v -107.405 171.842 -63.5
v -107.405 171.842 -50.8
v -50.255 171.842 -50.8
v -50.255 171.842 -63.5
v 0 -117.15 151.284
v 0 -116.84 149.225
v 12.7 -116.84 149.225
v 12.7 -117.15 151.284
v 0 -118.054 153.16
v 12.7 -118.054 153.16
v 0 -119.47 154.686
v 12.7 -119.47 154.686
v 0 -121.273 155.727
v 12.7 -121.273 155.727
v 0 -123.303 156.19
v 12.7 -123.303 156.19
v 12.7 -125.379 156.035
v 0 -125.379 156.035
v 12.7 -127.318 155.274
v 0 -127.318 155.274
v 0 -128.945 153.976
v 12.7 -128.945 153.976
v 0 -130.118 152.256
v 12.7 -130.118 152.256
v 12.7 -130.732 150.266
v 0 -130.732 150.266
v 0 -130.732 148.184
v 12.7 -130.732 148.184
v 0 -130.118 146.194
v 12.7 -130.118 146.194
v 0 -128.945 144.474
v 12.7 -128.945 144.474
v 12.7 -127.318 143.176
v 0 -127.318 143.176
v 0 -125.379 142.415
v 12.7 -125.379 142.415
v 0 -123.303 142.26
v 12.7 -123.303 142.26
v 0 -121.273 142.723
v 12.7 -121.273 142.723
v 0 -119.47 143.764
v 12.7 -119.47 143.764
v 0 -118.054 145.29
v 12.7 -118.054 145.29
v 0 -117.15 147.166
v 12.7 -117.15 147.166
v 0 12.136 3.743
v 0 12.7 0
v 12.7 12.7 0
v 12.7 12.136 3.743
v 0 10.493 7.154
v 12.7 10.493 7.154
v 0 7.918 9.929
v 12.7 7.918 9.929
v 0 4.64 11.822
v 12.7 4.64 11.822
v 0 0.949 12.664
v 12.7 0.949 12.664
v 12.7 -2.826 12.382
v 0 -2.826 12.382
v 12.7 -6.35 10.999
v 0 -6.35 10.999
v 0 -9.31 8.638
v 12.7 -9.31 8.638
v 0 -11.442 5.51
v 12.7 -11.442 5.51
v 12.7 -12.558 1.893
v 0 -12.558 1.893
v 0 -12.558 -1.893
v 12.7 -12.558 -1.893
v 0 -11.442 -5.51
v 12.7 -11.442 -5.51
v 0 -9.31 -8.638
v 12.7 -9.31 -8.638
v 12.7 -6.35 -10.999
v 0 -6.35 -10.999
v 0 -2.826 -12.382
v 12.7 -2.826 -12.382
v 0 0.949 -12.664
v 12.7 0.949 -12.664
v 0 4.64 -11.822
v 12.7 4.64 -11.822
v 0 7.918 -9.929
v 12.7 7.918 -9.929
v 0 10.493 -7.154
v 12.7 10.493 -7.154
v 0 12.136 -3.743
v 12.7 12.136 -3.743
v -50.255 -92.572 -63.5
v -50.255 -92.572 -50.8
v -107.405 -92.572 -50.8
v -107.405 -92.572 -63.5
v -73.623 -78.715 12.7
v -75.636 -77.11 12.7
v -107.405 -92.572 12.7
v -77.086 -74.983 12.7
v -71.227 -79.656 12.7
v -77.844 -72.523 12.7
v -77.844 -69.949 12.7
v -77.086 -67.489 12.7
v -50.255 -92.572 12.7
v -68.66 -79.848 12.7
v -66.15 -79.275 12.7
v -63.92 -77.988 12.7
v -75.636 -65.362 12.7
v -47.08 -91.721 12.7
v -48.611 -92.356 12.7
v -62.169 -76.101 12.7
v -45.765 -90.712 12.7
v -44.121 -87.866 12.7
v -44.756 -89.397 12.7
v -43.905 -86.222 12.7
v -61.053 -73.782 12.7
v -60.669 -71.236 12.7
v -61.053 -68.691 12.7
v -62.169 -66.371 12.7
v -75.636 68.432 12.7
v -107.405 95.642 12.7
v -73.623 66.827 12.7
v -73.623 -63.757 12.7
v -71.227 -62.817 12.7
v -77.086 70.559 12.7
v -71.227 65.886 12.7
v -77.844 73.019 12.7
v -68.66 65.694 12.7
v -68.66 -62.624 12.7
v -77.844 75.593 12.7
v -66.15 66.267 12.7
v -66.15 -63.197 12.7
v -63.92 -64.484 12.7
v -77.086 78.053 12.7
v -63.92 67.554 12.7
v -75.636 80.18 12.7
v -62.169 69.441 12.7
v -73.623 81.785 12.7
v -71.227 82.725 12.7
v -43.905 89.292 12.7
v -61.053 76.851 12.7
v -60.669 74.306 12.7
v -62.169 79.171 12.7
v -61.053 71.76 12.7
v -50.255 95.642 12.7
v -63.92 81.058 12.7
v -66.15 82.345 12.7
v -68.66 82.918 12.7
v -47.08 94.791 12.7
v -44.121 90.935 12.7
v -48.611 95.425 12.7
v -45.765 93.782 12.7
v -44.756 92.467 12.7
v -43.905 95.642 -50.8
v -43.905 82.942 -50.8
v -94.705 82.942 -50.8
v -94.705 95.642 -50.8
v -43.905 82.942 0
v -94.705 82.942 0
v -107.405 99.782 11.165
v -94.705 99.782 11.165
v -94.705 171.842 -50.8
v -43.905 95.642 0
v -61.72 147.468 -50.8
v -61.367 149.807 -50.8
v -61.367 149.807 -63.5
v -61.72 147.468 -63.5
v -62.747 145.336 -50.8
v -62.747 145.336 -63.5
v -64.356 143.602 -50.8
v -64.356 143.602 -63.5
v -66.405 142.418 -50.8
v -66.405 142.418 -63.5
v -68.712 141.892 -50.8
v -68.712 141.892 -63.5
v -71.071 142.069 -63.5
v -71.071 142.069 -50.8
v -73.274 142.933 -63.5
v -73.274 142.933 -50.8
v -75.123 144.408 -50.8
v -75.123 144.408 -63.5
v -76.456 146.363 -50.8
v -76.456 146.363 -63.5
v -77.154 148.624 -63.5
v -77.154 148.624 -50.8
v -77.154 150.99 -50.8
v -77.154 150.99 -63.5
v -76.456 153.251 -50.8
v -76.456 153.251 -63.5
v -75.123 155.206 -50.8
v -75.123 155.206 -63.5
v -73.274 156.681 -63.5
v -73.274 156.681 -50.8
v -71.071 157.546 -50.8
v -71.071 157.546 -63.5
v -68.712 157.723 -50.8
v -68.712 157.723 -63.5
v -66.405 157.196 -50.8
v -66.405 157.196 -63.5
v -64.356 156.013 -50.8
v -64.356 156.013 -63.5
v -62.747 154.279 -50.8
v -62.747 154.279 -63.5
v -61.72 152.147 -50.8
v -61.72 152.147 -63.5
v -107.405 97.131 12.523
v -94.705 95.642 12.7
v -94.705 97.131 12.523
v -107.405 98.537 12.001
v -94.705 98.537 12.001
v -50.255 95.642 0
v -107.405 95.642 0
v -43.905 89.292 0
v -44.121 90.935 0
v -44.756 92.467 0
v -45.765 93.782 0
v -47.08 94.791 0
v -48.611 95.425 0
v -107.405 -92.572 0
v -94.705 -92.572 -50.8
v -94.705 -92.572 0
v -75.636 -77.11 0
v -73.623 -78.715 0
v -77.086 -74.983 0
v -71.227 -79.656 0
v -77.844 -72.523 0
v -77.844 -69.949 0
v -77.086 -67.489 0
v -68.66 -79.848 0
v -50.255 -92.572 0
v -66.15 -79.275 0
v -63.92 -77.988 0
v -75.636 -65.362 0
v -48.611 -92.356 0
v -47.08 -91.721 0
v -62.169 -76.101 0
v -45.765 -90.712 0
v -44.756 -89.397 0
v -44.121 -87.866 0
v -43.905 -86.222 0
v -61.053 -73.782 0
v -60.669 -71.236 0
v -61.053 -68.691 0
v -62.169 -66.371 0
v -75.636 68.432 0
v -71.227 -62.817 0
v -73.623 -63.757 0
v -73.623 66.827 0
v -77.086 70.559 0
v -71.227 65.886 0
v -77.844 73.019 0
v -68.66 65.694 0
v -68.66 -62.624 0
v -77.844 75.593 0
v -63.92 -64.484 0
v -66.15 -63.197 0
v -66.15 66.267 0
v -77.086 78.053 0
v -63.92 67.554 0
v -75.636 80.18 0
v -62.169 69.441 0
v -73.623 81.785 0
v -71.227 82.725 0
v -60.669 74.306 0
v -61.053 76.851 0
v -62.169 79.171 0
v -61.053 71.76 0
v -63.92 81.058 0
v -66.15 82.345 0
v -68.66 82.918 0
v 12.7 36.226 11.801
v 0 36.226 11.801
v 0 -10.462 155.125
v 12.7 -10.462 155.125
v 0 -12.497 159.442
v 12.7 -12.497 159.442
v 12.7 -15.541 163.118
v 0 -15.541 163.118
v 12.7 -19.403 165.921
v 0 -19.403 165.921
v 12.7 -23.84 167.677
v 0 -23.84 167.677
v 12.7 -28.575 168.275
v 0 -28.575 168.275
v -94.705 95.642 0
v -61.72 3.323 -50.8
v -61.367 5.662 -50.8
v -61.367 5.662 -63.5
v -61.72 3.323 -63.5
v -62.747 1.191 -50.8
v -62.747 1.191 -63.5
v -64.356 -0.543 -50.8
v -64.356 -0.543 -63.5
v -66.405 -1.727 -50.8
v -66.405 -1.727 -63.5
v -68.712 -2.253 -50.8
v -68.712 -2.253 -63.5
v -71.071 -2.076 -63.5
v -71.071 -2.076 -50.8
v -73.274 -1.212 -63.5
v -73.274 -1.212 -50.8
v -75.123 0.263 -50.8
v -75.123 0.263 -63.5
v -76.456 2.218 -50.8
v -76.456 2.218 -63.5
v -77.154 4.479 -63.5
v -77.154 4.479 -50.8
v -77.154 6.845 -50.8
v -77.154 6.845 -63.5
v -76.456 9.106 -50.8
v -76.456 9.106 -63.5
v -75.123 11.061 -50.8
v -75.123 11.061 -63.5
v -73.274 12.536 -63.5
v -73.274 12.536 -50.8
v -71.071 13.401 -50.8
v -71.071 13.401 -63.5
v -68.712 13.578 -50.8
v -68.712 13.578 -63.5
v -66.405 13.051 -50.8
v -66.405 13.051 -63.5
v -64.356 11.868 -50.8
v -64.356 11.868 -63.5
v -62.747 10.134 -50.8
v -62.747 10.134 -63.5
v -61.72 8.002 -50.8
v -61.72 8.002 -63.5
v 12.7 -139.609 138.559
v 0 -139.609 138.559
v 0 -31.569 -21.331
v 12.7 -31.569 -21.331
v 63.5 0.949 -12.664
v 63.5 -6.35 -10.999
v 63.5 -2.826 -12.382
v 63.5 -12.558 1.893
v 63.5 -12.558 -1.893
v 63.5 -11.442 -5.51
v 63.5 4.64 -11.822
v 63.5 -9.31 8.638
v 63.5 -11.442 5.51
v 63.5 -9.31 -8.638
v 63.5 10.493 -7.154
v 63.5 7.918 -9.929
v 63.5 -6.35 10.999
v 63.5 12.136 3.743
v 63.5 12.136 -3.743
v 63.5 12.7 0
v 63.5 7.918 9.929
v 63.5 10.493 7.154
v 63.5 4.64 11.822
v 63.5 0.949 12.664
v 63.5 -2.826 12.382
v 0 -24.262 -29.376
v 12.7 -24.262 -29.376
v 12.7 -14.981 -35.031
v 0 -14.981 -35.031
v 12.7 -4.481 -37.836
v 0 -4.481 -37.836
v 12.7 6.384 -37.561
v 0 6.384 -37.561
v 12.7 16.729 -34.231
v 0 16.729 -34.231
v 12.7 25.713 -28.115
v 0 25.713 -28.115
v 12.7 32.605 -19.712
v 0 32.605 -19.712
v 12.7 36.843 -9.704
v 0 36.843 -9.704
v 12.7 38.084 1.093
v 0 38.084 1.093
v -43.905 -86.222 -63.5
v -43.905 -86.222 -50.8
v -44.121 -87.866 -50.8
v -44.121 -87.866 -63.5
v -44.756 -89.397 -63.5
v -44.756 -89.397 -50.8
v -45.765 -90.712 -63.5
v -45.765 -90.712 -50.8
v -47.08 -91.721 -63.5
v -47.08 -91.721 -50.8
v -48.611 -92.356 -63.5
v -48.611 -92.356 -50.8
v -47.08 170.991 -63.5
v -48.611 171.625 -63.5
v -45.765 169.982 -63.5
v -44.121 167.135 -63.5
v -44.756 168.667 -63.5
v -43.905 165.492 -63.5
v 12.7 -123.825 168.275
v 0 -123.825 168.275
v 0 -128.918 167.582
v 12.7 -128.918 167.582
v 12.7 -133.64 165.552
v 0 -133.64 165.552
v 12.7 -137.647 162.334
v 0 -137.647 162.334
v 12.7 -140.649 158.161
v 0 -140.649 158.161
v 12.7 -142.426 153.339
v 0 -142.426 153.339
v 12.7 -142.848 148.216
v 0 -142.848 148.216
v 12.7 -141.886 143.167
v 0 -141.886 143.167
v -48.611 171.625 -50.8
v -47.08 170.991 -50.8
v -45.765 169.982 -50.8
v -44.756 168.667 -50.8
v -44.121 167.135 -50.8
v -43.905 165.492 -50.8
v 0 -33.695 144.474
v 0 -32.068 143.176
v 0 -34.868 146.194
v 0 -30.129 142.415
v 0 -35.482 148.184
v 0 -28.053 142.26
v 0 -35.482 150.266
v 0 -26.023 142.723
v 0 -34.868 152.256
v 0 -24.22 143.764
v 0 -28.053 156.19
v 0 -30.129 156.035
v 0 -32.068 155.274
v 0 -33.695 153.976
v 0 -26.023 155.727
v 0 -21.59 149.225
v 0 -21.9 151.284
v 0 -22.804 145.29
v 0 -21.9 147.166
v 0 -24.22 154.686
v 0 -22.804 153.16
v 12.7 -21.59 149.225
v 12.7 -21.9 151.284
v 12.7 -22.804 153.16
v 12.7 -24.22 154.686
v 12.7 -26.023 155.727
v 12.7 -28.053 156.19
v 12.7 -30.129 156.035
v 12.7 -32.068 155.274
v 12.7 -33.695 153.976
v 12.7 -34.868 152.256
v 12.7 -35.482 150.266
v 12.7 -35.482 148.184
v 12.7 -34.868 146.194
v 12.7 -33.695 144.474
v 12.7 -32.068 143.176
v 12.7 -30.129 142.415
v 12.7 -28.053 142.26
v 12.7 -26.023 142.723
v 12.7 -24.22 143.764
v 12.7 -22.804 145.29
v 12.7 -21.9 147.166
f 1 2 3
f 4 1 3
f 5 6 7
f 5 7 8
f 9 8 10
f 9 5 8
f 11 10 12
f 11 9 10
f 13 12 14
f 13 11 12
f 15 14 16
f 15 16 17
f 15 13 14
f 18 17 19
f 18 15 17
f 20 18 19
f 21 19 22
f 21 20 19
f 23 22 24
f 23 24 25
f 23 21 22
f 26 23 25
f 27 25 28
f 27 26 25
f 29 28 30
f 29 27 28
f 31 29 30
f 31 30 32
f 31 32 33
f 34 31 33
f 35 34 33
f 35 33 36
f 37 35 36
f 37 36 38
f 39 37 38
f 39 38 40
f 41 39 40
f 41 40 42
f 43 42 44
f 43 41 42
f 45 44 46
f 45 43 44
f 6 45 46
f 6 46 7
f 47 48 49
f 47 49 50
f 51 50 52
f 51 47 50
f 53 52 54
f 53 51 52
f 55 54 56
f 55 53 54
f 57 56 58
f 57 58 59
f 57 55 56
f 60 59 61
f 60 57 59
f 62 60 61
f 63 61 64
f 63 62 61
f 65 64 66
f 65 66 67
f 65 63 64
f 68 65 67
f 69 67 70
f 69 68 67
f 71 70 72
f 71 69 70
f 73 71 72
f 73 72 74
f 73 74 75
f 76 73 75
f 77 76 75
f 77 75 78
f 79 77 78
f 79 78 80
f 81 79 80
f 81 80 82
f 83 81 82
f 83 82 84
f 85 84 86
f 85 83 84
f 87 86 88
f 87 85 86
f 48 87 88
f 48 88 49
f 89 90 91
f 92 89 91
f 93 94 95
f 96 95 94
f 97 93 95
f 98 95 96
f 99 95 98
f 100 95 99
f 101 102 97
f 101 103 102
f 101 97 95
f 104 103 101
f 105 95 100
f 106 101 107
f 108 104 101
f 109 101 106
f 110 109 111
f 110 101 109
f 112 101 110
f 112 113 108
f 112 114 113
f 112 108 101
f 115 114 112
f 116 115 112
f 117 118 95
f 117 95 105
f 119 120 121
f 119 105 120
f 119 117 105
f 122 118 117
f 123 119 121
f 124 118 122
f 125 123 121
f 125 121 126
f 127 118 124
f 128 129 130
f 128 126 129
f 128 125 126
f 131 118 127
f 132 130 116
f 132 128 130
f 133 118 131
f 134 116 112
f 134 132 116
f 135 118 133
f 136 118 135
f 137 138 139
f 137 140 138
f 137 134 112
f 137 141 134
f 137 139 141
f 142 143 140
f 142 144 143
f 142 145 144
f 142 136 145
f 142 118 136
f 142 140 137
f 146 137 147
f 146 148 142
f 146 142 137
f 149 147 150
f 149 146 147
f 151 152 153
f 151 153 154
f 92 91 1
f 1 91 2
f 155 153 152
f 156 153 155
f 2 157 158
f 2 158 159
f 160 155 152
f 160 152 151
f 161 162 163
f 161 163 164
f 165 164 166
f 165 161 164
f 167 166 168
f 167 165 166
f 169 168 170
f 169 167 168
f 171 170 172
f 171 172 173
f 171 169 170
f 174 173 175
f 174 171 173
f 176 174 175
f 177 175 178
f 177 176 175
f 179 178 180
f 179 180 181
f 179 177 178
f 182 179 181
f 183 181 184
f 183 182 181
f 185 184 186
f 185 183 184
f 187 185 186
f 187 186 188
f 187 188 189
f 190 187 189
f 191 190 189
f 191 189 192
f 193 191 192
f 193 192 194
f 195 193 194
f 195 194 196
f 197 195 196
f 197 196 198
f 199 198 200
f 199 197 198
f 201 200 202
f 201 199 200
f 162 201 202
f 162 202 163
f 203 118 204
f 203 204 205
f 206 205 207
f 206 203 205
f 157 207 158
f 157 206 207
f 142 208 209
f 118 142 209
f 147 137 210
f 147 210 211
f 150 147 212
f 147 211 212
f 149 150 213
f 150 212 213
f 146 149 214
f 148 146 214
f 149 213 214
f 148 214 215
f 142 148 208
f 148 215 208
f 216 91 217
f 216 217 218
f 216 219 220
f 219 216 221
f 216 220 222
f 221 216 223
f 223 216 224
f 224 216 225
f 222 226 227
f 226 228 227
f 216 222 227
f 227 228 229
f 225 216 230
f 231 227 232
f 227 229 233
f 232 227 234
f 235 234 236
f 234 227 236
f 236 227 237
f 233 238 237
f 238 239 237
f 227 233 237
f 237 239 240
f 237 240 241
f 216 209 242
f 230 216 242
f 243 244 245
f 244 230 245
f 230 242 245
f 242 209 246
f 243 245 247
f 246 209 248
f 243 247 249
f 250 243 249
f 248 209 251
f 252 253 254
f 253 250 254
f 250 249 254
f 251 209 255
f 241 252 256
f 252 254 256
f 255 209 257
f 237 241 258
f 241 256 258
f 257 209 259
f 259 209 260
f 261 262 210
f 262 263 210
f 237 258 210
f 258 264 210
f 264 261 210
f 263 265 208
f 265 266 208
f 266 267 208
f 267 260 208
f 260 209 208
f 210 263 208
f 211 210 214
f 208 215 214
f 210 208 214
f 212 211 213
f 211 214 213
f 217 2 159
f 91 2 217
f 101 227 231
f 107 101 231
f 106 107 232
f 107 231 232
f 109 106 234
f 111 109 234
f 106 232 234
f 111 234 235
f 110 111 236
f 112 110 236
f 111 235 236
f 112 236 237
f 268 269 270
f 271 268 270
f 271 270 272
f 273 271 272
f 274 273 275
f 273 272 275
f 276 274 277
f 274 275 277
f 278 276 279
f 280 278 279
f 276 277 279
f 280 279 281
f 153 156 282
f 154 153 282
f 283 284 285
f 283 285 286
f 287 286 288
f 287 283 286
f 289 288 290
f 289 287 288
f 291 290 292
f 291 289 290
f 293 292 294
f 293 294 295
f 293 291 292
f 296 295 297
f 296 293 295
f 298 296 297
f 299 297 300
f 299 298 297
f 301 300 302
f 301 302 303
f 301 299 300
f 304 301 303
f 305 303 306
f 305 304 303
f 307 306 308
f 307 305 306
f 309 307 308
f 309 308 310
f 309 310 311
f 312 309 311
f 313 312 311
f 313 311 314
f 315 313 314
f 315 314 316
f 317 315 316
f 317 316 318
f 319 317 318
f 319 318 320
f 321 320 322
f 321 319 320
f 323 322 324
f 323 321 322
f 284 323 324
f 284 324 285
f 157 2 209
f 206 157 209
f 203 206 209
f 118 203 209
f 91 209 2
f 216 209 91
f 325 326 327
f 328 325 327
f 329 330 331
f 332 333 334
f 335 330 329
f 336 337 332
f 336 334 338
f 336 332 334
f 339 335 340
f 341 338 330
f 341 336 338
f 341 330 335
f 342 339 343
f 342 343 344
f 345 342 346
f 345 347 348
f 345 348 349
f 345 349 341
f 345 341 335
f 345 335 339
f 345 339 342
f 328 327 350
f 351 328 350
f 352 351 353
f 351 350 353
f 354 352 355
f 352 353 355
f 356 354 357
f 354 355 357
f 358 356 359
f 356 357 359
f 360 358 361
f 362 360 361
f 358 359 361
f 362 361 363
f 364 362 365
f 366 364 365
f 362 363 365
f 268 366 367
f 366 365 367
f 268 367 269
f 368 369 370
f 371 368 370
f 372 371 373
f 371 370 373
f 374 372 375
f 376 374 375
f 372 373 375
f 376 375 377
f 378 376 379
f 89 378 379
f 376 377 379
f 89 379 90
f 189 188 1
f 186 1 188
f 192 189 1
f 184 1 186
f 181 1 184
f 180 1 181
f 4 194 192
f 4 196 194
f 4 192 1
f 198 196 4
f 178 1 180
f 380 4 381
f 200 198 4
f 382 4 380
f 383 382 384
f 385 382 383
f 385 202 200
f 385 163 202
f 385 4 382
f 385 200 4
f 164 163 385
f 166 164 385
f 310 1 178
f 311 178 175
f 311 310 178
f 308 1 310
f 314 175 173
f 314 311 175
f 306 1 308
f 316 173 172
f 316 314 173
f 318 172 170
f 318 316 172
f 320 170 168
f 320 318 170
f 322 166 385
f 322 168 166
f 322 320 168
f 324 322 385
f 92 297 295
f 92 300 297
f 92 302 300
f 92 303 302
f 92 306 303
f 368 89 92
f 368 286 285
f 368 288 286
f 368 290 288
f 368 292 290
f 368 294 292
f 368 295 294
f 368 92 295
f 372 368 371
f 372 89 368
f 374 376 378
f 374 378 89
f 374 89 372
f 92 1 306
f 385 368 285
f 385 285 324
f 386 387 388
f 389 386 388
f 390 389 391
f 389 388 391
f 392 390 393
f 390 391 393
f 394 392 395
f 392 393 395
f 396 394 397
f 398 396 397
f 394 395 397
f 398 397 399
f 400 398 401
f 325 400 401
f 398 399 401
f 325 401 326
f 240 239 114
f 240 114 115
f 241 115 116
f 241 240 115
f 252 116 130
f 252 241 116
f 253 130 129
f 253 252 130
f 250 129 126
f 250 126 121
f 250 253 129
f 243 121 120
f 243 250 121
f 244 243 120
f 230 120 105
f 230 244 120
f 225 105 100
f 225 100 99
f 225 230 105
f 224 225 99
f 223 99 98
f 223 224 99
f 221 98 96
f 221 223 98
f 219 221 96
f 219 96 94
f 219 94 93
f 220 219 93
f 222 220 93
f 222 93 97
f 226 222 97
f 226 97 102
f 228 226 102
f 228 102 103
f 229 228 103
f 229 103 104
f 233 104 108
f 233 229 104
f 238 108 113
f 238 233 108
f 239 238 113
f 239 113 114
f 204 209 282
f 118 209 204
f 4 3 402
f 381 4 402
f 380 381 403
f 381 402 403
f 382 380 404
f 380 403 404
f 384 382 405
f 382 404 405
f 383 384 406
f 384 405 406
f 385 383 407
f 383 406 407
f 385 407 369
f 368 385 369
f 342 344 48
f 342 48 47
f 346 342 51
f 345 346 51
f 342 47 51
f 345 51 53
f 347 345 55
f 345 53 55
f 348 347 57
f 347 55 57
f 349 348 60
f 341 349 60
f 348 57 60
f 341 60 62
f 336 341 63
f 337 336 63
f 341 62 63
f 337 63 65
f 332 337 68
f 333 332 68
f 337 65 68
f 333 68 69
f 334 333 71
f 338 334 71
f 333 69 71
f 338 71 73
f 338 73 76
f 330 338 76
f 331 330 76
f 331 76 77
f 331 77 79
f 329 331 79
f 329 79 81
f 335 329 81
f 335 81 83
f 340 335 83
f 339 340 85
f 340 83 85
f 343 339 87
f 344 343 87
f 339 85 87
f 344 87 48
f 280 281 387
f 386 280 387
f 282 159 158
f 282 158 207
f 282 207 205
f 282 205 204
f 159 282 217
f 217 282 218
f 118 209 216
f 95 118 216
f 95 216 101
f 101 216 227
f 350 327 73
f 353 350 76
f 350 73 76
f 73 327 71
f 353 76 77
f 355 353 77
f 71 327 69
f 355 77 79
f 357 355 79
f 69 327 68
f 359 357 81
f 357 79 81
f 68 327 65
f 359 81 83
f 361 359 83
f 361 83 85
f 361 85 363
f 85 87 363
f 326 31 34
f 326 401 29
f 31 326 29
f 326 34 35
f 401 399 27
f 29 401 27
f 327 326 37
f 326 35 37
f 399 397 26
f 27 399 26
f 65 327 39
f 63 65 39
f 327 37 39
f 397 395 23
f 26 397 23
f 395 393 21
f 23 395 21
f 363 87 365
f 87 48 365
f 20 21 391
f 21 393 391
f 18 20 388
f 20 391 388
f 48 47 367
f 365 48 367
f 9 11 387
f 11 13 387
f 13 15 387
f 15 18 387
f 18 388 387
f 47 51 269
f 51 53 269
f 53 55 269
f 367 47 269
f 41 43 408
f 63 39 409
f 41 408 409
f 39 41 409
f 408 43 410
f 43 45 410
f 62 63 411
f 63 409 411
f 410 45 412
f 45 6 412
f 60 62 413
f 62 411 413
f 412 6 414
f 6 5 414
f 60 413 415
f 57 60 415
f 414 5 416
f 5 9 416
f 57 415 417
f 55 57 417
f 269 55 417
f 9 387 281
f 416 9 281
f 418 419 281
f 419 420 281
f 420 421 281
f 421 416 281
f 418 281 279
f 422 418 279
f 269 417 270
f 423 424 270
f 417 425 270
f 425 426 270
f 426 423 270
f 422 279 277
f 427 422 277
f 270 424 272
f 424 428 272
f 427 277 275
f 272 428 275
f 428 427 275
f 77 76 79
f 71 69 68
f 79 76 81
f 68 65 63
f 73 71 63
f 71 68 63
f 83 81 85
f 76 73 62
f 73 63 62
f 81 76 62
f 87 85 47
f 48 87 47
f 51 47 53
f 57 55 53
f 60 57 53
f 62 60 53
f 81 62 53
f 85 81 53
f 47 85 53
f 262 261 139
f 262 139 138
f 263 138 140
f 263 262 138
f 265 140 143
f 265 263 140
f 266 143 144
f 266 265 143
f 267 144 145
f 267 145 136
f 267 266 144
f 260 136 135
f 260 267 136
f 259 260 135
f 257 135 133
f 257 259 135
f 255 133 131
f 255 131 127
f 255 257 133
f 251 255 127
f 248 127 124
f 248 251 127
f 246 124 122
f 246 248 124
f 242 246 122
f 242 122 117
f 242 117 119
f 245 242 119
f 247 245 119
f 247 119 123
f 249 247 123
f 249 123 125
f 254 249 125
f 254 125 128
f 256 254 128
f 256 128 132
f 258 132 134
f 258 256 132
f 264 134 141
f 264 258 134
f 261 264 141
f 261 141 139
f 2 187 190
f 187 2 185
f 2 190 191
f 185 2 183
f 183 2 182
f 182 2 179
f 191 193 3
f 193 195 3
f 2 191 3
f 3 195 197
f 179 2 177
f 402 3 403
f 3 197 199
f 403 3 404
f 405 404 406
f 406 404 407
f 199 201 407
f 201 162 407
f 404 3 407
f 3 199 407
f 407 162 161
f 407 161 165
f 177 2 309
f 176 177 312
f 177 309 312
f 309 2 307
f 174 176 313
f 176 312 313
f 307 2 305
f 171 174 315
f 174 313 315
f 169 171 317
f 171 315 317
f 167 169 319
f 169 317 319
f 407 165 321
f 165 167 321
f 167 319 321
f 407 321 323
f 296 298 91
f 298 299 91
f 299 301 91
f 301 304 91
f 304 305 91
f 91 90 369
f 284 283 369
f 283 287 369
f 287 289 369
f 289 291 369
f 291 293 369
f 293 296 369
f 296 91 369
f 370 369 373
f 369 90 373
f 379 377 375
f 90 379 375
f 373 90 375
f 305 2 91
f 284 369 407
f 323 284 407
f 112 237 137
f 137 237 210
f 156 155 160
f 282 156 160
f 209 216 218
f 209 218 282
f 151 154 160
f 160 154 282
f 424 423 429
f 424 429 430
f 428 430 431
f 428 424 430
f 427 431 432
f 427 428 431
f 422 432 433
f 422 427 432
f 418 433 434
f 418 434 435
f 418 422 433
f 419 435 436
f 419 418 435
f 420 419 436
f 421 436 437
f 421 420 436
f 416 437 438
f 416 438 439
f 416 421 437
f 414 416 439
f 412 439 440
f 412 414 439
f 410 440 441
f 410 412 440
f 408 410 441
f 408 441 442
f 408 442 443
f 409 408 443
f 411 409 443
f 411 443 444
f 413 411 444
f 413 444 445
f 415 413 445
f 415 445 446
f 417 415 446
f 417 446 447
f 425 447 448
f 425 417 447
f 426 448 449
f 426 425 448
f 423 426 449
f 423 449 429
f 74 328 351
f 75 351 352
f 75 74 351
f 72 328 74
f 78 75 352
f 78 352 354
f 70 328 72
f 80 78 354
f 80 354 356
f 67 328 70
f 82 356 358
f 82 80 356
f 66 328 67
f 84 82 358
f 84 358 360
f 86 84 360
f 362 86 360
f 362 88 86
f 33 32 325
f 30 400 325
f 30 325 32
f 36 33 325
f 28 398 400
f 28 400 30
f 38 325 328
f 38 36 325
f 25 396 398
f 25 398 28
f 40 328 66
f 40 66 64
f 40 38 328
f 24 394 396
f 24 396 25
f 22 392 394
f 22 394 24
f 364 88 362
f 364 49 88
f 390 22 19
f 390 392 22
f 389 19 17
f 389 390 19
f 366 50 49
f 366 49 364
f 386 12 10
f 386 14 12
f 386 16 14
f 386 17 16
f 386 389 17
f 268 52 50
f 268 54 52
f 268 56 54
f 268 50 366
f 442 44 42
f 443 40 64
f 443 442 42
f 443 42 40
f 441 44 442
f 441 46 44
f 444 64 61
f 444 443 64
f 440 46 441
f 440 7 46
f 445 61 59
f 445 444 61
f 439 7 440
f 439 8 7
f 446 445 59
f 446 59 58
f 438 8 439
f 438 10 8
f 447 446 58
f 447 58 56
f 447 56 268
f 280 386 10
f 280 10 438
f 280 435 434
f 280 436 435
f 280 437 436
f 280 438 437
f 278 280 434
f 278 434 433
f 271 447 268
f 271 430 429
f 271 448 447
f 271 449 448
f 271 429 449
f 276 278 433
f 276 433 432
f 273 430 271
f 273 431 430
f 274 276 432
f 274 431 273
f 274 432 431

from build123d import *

# Parameters (mm, degrees)
F0_R      = 12.7
F1_DEPTH  = 63.5
F0_R_2    = 6.985
F2_DEPTH  = 12.7
F3_R      = 8.636
F4_DEPTH  = 12.7
F6_DEPTH  = 12.7
F7_W      = 12.7
F7_H      = 50.8
F8_DEPTH  = 50.8
F9_R      = 7.9375
F10_DEPTH = 12.7


with BuildPart() as f1:
    # F0 (on Right) → F1 (new body)
    with BuildSketch(Plane.YZ):
        Circle(F0_R)
    extrude(amount=F1_DEPTH)


with BuildPart() as f2:
    # F0 (on Right) → F2 (new body)
    with BuildSketch(Plane.YZ):
        with BuildLine():
            Line((-28.575, 168.275), (-123.825, 168.275))
            ThreePointArc((-123.825, 168.275), (-140.648858, 158.161458), (-139.609327, 138.559282))
            Line((-139.609327, 138.559282), (-31.568653, -21.331436))
            ThreePointArc((-31.568653, -21.331436), (16.729012, -34.230836), (36.226388, 11.800798))
            Line((36.226388, 11.800798), (-10.461806, 155.125399))
            ThreePointArc((-10.461806, 155.125399), (-17.383488, 164.640984), (-28.575, 168.275))
        make_face()
        Circle(F0_R, mode=Mode.SUBTRACT)
        with Locations((-123.825, 149.225)):
            Circle(F0_R_2, mode=Mode.SUBTRACT)
        with Locations((-28.575, 149.225)):
            Circle(F0_R_2, mode=Mode.SUBTRACT)
    extrude(amount=F2_DEPTH)


with BuildPart() as f4:
    # F3 (on Top) → F4 (new body)
    with BuildSketch(Plane.XY):
        with BuildLine():
            Line((-50.254895, 95.641809), (-107.404895, 95.641809))
            Line((-107.404895, 95.641809), (-107.404895, -92.572191))
            Line((-107.404895, -92.572191), (-50.254895, -92.572191))
            ThreePointArc((-50.254895, -92.572191), (-45.764767, -90.712319), (-43.904895, -86.222191))
            Line((-43.904895, -86.222191), (-43.904895, 89.291809))
            ThreePointArc((-43.904895, 89.291809), (-45.764767, 93.781937), (-50.254895, 95.641809))
        make_face()
        with Locations((-69.304895, -71.236191)):
            Circle(F3_R, mode=Mode.SUBTRACT)
        with Locations((-69.304895, 74.305809)):
            Circle(F3_R, mode=Mode.SUBTRACT)
    extrude(amount=F4_DEPTH)


with BuildPart() as f6:
    # F5 (on face) → F6 (new body)
    with BuildSketch(Plane(origin=(-107.404895, 0, 0), x_dir=(0, -1, 0), z_dir=(-1, 0, 0))):
        with BuildLine():
            ThreePointArc((-95.641809, 12.7), (-97.849654, 12.303815), (-99.781999, 11.164699))
            Line((-99.781999, 11.164699), (-171.841809, -50.8))
            Line((-171.841809, -50.8), (92.572191, -50.8))
            Line((92.572191, -50.8), (92.572191, 0))
            Line((92.572191, 0), (-95.641809, 0))
            Line((-95.641809, 0), (-95.641809, 12.7))
        make_face()
    extrude(amount=-F6_DEPTH)


with BuildPart() as f8:
    # F7 (on face) → F8 (new body, through all)
    with BuildSketch(Plane.YZ.offset(-94.704895)):
        with Locations((89.291809, -25.4)):
            Rectangle(F7_W, F7_H)
    extrude(amount=F8_DEPTH)


with BuildPart() as f10:
    # F9 (on face) → F10 (new body)
    with BuildSketch(Plane(origin=(0, 0, -50.8), x_dir=(1, 0, 0), z_dir=(0, 0, -1))):
        with BuildLine():
            Line((-107.404895, 92.572191), (-107.404895, -171.841809))
            Line((-107.404895, -171.841809), (-50.254895, -171.841809))
            ThreePointArc((-50.254895, -171.841809), (-45.764767, -169.981937), (-43.904895, -165.491809))
            Line((-43.904895, -165.491809), (-43.904895, 86.222191))
            ThreePointArc((-43.904895, 86.222191), (-45.764767, 90.712319), (-50.254895, 92.572191))
            Line((-50.254895, 92.572191), (-107.404895, 92.572191))
        make_face()
        with Locations((-69.304895, -149.807309)):
            Circle(F9_R, mode=Mode.SUBTRACT)
        with Locations((-69.304895, -5.662309)):
            Circle(F9_R, mode=Mode.SUBTRACT)
    extrude(amount=F10_DEPTH)


solid = Compound([f1.part, f2.part, f4.part, f6.part, f8.part, f10.part])
